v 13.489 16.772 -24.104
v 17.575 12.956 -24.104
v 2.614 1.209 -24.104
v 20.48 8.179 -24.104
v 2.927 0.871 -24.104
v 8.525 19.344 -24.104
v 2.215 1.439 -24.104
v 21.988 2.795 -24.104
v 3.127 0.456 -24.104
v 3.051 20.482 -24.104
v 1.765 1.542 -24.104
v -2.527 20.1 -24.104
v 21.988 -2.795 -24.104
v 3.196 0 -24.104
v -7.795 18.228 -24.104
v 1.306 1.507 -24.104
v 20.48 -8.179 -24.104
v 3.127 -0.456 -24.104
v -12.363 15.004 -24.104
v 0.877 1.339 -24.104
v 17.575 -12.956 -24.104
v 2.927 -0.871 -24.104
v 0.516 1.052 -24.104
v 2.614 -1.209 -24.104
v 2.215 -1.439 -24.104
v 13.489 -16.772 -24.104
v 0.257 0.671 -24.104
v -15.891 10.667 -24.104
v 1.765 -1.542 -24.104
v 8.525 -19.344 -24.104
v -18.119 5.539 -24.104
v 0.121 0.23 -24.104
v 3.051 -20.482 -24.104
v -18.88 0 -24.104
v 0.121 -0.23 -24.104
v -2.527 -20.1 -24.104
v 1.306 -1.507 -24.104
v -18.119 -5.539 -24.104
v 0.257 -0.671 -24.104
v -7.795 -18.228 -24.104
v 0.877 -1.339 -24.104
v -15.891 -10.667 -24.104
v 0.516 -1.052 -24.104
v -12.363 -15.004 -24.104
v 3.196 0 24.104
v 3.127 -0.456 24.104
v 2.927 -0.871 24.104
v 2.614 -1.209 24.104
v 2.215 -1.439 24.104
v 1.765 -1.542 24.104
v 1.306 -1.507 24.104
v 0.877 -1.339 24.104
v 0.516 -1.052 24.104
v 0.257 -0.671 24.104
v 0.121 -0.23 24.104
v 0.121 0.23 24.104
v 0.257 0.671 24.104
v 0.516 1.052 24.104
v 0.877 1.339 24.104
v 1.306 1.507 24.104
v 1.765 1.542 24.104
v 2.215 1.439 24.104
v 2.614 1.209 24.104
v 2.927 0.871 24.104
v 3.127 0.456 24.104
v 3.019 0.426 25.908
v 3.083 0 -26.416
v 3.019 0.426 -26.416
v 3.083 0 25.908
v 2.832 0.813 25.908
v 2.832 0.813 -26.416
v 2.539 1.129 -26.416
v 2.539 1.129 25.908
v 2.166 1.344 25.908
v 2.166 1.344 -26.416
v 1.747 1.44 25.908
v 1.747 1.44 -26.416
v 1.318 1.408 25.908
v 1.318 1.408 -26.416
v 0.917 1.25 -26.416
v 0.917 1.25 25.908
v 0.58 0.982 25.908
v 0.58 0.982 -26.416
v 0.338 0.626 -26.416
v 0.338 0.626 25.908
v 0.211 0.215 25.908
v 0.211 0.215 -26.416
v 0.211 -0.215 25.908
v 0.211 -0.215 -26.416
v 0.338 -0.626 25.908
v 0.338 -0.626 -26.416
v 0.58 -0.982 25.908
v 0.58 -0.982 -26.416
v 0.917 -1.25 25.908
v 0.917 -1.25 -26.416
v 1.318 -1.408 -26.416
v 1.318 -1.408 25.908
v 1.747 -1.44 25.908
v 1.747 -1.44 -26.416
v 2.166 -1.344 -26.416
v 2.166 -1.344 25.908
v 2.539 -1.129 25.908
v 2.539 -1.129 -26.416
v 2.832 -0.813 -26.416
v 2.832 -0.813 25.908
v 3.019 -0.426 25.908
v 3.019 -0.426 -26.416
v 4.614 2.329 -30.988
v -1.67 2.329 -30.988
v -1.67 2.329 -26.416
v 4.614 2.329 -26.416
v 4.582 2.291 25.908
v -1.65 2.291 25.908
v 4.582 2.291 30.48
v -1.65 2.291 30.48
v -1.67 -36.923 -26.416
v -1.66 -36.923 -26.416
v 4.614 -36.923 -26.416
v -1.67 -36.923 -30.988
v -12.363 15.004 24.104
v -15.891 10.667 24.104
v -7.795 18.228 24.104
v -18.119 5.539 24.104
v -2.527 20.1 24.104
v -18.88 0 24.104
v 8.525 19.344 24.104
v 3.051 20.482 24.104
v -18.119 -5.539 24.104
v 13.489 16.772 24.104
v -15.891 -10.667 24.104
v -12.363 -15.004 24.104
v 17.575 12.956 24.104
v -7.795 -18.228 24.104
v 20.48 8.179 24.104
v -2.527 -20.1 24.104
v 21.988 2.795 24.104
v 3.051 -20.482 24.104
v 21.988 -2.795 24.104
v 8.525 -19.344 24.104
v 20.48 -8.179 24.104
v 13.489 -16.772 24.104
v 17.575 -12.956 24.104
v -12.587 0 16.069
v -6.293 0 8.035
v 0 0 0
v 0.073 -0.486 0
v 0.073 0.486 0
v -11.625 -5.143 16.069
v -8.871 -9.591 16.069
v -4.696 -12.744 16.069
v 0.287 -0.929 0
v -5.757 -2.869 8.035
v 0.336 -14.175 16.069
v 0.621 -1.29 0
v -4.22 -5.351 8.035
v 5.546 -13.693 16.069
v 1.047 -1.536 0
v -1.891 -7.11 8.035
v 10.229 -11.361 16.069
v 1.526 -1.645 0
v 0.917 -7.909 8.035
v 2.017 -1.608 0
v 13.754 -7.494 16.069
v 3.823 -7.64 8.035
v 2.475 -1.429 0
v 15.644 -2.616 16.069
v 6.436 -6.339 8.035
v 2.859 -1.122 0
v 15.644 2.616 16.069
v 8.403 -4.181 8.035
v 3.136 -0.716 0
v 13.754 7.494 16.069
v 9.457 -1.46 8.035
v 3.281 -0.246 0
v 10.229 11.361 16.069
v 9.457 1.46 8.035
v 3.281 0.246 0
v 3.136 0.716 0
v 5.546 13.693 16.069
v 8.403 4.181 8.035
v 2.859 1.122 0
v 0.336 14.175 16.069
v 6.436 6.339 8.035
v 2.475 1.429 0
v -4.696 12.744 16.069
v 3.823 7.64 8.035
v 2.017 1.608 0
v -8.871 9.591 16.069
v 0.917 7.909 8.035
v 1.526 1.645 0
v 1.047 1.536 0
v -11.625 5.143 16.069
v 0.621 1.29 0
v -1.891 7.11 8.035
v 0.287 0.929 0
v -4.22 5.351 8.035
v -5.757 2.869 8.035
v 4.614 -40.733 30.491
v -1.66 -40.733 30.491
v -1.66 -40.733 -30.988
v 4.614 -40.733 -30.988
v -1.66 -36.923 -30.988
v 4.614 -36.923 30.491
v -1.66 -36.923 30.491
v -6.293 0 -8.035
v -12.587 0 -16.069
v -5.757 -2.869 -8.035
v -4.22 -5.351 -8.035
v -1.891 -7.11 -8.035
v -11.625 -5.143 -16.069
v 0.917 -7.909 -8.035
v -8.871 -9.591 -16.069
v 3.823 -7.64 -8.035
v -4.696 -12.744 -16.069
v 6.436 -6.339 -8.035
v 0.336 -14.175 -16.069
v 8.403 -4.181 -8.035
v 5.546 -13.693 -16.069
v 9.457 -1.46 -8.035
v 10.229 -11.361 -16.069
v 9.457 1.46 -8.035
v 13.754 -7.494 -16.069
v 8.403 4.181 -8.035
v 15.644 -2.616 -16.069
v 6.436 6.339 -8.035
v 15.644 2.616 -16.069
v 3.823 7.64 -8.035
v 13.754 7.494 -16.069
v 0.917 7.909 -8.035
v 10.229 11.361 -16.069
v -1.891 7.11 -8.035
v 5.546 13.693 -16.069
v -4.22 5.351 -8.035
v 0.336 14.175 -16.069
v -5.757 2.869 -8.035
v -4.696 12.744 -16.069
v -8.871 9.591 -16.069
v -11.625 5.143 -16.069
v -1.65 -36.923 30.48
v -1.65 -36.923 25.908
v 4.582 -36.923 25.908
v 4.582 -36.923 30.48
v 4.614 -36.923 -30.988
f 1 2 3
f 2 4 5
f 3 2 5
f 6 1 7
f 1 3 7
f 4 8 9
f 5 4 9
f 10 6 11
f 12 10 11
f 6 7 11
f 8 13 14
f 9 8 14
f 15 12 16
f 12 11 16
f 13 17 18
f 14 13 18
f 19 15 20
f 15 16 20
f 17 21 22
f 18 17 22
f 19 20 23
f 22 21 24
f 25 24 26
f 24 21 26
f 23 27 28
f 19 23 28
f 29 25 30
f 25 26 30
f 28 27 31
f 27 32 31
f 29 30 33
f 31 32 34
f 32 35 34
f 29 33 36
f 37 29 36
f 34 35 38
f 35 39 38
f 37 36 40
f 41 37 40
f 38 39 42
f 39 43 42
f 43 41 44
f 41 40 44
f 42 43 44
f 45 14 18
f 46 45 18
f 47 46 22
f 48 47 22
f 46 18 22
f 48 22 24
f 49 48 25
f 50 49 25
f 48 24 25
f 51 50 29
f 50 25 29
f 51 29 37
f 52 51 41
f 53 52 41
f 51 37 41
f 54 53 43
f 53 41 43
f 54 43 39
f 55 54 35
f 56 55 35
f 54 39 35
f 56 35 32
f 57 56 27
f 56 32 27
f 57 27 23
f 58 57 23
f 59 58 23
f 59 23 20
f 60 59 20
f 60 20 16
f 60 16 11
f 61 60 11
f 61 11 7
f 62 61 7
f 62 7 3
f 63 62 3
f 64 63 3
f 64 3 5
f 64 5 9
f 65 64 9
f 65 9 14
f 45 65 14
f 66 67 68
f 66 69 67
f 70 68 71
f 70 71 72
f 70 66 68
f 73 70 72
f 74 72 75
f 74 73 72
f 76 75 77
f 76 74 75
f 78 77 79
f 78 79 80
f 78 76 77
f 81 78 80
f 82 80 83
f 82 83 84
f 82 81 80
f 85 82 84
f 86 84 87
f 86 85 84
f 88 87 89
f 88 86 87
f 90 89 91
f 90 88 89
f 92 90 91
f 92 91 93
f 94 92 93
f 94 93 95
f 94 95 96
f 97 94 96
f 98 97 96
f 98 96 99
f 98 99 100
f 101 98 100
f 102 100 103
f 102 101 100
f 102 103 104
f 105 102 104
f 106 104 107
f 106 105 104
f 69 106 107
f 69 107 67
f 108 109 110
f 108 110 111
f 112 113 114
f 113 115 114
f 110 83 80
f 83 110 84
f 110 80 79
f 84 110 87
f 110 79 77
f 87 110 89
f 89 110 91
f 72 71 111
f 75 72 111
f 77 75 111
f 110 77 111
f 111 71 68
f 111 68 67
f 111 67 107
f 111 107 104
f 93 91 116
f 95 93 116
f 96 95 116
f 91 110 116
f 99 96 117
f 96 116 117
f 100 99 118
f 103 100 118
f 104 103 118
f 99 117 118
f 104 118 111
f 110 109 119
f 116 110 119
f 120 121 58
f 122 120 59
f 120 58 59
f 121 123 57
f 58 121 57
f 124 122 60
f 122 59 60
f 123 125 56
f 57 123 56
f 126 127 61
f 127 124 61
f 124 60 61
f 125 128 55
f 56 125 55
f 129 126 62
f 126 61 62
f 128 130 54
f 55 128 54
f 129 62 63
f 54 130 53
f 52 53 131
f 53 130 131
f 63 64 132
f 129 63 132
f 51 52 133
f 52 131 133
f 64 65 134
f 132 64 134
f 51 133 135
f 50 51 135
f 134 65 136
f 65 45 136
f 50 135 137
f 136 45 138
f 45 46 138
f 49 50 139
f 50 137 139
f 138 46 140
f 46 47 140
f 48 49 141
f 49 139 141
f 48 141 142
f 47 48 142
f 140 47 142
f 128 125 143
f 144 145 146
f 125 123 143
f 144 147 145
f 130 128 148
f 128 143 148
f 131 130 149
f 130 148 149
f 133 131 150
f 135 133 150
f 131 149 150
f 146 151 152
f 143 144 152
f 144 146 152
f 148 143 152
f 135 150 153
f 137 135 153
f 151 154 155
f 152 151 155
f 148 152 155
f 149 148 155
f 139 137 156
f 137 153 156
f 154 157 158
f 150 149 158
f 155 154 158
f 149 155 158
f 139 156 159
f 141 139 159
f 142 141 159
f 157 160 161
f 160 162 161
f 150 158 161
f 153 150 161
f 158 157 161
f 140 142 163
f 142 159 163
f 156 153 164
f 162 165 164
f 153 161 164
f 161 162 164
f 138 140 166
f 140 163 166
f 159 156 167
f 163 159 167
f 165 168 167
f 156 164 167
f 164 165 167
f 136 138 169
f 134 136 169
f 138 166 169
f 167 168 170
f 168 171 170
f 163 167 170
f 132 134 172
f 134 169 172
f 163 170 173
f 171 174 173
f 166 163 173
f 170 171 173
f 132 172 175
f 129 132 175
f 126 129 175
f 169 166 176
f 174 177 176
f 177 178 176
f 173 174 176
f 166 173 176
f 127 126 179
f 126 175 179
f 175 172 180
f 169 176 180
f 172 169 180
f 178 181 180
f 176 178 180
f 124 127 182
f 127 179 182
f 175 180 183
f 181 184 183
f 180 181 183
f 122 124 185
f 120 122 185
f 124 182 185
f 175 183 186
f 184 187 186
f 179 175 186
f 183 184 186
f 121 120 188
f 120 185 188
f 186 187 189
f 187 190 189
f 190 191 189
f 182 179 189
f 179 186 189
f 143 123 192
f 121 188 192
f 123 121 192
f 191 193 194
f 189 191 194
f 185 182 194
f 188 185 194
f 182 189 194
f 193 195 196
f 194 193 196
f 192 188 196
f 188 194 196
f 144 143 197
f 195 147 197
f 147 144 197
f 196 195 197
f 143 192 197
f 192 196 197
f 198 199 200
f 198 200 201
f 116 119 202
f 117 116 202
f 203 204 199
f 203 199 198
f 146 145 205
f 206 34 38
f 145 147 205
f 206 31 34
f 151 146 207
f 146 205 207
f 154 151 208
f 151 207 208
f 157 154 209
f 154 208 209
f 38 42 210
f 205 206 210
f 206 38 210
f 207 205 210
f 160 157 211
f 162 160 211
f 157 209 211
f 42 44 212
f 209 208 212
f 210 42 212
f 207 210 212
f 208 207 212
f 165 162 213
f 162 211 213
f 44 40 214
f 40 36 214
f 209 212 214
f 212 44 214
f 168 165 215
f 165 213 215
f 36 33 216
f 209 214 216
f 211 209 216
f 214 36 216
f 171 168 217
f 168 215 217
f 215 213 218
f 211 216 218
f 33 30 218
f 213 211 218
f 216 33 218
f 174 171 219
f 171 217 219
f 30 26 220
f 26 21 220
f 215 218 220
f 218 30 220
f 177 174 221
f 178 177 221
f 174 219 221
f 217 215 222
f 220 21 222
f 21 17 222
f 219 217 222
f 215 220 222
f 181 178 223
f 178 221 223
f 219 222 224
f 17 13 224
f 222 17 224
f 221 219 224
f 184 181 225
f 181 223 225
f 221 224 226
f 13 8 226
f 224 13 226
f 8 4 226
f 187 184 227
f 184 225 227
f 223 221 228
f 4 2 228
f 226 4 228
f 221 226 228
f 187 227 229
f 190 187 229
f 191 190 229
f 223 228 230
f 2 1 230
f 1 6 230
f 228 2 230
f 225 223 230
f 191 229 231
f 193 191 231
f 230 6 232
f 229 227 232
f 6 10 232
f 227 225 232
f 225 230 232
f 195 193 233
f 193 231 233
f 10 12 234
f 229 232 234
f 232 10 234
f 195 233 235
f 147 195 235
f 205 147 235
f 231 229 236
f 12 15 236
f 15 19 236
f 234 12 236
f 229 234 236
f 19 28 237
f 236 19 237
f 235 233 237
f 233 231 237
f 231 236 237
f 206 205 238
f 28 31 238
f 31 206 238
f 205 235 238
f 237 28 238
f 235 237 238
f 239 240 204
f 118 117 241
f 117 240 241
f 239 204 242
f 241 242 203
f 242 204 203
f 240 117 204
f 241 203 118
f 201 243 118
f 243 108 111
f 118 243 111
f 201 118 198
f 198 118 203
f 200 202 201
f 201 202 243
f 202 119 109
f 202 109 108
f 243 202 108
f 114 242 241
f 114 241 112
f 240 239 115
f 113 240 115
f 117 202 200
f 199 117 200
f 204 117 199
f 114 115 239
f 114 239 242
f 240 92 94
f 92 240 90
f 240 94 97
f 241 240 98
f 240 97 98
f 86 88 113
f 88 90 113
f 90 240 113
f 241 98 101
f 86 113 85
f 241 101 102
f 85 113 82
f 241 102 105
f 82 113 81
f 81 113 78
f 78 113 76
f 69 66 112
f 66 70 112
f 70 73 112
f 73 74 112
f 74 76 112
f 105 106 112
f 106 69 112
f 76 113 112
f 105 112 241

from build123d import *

# Parameters (mm, degrees)
F2_R          = 1.5460730092
F3_DEPTH      = 70.612
F4_R          = 1.4438423295
F5_DEPTH      = 26.67
F5_DEPTH_BACK = 27.178
F6_W          = 6.2321644509
F6_H          = 39.2259815708
F7_DEPTH      = 3.81
F7_DEPTH_BACK = 0.762
F8_W          = 6.2844125787
F8_H          = 39.2518651206
F9_DEPTH      = 3.81
F9_DEPTH_BACK = 0.762
F10_W         = 6.2738864217
F10_H         = 61.4785362427
F11_DEPTH     = 3.81


with BuildPart() as f1:
    # F0 (on Front) → F1 (revolve)
    with BuildSketch(Plane.XZ):
        Polygon((-18.8797935843, 24.103814736), (0, 0), (-18.8797935843, -24.103814736), (1.649691374, -24.103814736), (1.649691374, 0), (1.649691374, 24.103814736), align=None)
    revolve(axis=Axis((1.649691374, 0, -12.051907368), (0, 0, 1)))

    # F2 (on face) → F3 (cut)
    with BuildSketch(Plane(origin=(0, 0, -24.103814736), x_dir=(1, 0, 0), z_dir=(0, 0, -1))):
        with Locations((1.649691374, 0)):
            Circle(F2_R)
    extrude(amount=-F3_DEPTH, mode=Mode.SUBTRACT)


with BuildPart() as f5:
    # F4 (on Top) → F5 (new body, two sides)
    with BuildSketch(Plane.XY) as f5_sk:
        with Locations((1.6388042131, 0)):
            Circle(F4_R)
    extrude(amount=F5_DEPTH)
    extrude(f5_sk.sketch, amount=-F5_DEPTH_BACK)

    # F6 (on face) → F7 (join, two sides)
    with BuildSketch(Plane.XY.offset(26.67)) as f7_sk:
        with Locations((1.4663913171, -17.3217537813)):
            Rectangle(F6_W, F6_H)
    extrude(amount=F7_DEPTH)
    extrude(f7_sk.sketch, amount=-F7_DEPTH_BACK)

    # F8 (on face) → F9 (join, two sides)
    with BuildSketch(Plane(origin=(0, 0, -27.178), x_dir=(1, 0, 0), z_dir=(0, 0, -1))) as f9_sk:
        with Locations((1.4721277985, 17.2971443972)):
            Rectangle(F8_W, F8_H)
    extrude(amount=F9_DEPTH)
    extrude(f9_sk.sketch, amount=-F9_DEPTH_BACK)

    # F10 (on face) → F11 (join)
    with BuildSketch(Plane.XZ.offset(36.9230769575)):
        with Locations((1.477390877, -0.2487318786)):
            Rectangle(F10_W, F10_H)
    extrude(amount=F11_DEPTH)


solid = Compound([f1.part, f5.part])
